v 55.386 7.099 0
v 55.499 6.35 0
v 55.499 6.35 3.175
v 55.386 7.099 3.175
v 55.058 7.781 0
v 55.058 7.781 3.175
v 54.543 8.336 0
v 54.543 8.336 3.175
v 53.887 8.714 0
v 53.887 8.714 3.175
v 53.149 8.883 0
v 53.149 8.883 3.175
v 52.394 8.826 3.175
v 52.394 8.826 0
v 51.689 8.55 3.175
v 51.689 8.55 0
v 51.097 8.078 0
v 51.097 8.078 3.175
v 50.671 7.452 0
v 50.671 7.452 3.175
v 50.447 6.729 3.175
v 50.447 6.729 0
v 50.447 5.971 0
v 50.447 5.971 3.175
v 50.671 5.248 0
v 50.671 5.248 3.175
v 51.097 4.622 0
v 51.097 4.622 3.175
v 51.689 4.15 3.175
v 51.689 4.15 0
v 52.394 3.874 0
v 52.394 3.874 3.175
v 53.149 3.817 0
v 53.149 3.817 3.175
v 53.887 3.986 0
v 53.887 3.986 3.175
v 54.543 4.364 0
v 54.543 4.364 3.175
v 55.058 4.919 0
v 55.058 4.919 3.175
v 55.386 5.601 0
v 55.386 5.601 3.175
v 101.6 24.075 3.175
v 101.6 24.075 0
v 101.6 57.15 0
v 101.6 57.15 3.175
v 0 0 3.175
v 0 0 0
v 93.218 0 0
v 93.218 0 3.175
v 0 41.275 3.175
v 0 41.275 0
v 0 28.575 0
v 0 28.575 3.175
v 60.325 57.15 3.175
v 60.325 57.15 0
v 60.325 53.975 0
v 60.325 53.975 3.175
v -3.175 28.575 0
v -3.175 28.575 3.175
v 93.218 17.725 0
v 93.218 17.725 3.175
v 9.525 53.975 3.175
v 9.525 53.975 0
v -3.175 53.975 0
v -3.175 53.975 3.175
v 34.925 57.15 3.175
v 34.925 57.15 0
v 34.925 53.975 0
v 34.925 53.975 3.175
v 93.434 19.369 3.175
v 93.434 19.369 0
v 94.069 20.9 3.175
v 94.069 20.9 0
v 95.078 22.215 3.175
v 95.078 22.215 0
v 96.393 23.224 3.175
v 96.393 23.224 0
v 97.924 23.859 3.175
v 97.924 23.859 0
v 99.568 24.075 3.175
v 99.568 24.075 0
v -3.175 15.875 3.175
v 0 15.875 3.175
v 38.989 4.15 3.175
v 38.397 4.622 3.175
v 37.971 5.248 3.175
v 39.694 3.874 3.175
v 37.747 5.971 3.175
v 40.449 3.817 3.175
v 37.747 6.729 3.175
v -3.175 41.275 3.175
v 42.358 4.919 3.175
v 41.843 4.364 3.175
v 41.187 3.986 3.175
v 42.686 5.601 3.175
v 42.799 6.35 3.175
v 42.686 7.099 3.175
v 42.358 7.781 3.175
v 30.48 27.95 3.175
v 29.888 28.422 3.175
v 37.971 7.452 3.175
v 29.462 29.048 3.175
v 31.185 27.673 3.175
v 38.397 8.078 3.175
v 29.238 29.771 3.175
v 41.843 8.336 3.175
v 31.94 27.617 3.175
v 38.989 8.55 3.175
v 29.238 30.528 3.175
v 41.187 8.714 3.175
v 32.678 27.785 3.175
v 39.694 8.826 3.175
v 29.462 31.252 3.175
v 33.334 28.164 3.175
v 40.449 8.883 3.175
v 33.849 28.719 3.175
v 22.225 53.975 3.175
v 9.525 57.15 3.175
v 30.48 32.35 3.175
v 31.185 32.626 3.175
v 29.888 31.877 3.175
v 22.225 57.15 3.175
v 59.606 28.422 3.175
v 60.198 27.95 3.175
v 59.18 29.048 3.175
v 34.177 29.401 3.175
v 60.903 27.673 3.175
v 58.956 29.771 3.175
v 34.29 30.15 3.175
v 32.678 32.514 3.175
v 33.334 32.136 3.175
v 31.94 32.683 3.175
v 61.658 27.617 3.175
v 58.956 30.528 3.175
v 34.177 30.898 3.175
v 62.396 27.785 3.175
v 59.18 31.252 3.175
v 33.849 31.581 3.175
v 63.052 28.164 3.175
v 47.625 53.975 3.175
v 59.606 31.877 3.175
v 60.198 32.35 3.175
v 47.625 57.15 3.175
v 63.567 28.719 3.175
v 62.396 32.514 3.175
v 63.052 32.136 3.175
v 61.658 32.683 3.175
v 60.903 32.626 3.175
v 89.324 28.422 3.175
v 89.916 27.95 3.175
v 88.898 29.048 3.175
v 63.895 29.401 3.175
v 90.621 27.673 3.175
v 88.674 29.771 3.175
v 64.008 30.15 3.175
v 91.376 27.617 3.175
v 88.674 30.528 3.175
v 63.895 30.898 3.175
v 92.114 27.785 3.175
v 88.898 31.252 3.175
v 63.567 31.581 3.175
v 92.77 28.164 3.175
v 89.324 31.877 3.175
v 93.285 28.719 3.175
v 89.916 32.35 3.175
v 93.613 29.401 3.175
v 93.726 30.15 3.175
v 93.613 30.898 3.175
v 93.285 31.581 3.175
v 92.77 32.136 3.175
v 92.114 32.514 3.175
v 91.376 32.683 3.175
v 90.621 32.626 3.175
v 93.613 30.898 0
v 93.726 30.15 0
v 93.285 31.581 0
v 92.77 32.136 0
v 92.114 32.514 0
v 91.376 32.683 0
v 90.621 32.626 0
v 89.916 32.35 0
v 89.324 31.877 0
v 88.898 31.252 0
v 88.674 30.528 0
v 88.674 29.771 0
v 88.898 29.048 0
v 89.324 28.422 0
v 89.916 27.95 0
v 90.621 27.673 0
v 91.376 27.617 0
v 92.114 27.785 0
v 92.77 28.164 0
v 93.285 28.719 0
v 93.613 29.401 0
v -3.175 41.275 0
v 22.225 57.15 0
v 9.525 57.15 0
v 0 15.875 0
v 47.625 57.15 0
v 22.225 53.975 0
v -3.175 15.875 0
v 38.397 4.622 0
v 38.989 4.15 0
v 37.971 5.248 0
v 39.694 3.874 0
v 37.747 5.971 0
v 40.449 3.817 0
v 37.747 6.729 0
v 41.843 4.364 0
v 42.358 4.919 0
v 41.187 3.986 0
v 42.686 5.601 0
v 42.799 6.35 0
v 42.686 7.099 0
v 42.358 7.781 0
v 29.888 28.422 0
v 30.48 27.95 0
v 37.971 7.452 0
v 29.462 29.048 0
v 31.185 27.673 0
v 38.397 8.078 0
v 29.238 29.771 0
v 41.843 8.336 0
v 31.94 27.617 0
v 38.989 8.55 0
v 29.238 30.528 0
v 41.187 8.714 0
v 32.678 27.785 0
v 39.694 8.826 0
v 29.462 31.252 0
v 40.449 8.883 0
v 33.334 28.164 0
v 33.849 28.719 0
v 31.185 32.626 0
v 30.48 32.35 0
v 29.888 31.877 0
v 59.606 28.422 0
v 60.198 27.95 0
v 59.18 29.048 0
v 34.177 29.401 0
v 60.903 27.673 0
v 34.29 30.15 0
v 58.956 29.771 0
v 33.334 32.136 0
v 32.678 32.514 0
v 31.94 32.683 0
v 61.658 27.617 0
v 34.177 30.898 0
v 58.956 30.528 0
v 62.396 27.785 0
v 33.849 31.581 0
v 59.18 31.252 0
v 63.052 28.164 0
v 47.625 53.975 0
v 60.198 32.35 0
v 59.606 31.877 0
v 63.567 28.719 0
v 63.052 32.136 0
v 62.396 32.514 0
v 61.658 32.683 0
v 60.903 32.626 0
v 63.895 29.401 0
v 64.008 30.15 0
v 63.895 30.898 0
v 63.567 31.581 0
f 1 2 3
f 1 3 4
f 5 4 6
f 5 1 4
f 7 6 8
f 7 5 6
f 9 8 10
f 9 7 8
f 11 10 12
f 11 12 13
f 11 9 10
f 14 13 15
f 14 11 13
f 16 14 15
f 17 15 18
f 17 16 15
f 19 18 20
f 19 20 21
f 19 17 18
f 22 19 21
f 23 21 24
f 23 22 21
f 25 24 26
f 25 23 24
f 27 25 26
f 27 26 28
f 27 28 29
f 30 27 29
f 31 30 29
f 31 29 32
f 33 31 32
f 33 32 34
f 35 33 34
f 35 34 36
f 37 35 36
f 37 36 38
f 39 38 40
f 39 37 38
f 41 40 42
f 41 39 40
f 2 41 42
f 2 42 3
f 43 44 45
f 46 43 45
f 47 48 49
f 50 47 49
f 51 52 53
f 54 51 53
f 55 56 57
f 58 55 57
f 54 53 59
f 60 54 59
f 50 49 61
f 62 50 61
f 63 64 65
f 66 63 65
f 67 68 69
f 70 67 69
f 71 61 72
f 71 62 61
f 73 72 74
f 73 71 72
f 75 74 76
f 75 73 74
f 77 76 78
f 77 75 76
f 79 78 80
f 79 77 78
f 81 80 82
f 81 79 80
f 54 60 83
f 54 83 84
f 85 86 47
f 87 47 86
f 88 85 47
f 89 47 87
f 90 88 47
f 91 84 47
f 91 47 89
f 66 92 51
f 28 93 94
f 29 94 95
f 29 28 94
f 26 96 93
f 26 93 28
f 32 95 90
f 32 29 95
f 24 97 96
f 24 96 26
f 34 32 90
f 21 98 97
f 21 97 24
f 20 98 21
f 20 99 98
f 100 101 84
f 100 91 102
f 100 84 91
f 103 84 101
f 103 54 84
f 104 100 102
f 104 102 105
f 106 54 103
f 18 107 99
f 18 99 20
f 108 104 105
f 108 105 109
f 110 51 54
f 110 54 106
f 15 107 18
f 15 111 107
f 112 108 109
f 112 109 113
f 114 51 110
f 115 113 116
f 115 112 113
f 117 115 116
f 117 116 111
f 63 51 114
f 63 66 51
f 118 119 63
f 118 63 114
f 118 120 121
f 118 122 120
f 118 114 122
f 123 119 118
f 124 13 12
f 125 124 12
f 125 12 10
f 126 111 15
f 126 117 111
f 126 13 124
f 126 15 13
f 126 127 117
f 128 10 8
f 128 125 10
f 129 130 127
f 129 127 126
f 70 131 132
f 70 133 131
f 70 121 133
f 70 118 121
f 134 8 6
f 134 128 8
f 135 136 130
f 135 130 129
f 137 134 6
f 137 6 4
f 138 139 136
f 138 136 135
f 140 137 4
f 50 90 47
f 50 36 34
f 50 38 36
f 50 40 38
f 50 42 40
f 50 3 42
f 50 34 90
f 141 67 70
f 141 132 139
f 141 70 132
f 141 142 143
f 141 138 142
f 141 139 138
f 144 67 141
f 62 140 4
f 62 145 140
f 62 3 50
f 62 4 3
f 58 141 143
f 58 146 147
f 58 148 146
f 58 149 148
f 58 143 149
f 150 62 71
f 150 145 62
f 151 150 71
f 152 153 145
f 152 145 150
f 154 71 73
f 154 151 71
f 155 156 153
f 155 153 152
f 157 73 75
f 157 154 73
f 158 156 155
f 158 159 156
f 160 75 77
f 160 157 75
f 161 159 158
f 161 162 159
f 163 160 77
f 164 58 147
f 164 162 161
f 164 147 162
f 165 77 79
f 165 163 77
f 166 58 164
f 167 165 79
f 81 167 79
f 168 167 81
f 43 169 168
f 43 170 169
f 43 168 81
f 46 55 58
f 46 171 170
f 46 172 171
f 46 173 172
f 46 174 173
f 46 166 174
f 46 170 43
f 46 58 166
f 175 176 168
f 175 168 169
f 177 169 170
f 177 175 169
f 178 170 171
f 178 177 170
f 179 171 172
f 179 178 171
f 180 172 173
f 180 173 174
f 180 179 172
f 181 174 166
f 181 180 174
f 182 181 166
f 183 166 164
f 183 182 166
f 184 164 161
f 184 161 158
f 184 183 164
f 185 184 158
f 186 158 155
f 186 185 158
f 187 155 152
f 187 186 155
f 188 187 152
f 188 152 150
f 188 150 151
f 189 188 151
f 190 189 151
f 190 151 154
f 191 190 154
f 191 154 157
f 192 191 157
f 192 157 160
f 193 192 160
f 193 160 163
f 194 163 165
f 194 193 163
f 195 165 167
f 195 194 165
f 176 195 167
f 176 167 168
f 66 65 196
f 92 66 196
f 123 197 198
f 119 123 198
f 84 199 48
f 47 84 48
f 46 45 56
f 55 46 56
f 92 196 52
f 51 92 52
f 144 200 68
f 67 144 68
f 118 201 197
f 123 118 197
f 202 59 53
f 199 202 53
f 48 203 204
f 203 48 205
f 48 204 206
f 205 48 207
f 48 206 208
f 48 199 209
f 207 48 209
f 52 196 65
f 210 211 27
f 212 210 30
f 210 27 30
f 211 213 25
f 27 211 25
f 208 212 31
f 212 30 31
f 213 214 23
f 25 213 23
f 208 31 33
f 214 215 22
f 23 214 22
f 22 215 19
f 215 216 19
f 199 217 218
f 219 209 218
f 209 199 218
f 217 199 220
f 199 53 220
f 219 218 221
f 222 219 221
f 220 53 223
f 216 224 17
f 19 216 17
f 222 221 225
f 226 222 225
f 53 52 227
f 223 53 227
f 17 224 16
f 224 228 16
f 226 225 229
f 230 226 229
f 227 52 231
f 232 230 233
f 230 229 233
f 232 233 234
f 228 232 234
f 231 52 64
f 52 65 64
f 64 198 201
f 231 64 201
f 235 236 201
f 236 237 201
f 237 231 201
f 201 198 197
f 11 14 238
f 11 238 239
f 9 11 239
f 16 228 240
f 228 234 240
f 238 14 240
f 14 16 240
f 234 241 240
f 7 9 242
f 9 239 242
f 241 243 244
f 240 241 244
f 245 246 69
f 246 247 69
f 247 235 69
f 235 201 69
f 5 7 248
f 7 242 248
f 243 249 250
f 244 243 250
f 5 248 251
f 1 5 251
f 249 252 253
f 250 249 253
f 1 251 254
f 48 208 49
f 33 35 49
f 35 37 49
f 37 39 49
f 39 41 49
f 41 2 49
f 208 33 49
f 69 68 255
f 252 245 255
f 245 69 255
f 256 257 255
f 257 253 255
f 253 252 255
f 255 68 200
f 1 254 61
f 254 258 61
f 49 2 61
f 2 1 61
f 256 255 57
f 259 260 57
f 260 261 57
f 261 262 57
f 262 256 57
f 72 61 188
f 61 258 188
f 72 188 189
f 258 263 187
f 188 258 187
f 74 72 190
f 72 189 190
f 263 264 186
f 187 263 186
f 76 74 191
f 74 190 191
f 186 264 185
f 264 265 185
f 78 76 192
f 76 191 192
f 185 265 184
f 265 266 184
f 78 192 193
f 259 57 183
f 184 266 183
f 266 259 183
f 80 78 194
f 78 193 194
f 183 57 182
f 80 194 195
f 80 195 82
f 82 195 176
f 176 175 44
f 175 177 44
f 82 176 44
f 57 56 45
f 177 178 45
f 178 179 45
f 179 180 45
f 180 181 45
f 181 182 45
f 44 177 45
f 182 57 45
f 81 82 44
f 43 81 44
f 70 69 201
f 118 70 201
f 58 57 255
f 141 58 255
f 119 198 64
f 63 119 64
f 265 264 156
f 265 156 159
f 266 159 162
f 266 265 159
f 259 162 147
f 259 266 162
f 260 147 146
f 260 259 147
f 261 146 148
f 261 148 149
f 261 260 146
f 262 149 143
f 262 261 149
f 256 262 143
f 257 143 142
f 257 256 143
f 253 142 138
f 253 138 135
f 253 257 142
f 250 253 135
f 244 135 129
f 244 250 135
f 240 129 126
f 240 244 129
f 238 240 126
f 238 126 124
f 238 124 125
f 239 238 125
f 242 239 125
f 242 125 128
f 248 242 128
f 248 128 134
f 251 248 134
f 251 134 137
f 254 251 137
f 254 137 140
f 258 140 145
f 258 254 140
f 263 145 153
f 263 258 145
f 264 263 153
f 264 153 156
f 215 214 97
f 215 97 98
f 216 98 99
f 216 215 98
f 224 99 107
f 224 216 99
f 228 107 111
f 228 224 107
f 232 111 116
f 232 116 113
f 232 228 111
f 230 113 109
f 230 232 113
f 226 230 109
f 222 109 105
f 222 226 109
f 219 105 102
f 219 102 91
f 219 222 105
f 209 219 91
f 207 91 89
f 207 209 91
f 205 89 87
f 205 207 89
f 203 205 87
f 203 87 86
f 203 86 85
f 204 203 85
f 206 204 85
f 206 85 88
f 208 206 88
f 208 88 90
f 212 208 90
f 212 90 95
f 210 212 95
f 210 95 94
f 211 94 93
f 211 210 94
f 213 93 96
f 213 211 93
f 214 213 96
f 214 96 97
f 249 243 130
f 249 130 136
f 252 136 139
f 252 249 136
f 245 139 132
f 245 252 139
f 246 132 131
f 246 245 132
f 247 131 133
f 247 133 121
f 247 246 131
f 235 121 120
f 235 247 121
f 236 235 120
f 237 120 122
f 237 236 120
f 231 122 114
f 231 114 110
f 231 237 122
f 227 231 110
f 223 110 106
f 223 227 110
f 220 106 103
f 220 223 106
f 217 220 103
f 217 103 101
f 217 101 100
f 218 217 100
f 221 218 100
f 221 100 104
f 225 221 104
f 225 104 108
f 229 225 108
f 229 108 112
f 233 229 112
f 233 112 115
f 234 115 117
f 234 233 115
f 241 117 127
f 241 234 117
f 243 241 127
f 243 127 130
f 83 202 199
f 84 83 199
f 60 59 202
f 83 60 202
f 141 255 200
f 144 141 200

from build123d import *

# Parameters (mm, degrees)
SKETCH1_R           = 2.54
BOSS_EXTRUDE1_DEPTH = 3.175
FILLET1_R           = 6.35


with BuildPart() as part:
    # Sketch1 → Boss-Extrude1 (new body)
    with BuildSketch(Plane.XY):
        Polygon((0, 15.875), (0, 0), (93.218, 0), (93.218, 24.07511214), (101.6, 24.07511214), (101.6, 57.15), (60.325, 57.15), (60.325, 53.975), (47.625, 53.975), (47.625, 57.15), (34.925, 57.15), (34.925, 53.975), (22.225, 53.975), (22.225, 57.15), (9.525, 57.15), (9.525, 53.975), (-3.175, 53.975), (-3.175, 41.275), (0, 41.275), (0, 28.575), (-3.175, 28.575), (-3.175, 15.875), align=None)
        with Locations((40.259, 6.35)):
            Circle(SKETCH1_R, mode=Mode.SUBTRACT)
        with Locations((52.959, 6.35)):
            Circle(SKETCH1_R, mode=Mode.SUBTRACT)
        with Locations((31.75, 30.1498)):
            Circle(SKETCH1_R, mode=Mode.SUBTRACT)
        with Locations((61.468, 30.1498)):
            Circle(SKETCH1_R, mode=Mode.SUBTRACT)
        with Locations((91.186, 30.1498)):
            Circle(SKETCH1_R, mode=Mode.SUBTRACT)
    extrude(amount=BOSS_EXTRUDE1_DEPTH)

    # Fillet1
    fillet1_edges = [part.edges().sort_by_distance(p)[0] for p in [
        (93.218, 24.07511214, 1.5875),
    ]]
    fillet(fillet1_edges, radius=FILLET1_R)


solid = part.part
